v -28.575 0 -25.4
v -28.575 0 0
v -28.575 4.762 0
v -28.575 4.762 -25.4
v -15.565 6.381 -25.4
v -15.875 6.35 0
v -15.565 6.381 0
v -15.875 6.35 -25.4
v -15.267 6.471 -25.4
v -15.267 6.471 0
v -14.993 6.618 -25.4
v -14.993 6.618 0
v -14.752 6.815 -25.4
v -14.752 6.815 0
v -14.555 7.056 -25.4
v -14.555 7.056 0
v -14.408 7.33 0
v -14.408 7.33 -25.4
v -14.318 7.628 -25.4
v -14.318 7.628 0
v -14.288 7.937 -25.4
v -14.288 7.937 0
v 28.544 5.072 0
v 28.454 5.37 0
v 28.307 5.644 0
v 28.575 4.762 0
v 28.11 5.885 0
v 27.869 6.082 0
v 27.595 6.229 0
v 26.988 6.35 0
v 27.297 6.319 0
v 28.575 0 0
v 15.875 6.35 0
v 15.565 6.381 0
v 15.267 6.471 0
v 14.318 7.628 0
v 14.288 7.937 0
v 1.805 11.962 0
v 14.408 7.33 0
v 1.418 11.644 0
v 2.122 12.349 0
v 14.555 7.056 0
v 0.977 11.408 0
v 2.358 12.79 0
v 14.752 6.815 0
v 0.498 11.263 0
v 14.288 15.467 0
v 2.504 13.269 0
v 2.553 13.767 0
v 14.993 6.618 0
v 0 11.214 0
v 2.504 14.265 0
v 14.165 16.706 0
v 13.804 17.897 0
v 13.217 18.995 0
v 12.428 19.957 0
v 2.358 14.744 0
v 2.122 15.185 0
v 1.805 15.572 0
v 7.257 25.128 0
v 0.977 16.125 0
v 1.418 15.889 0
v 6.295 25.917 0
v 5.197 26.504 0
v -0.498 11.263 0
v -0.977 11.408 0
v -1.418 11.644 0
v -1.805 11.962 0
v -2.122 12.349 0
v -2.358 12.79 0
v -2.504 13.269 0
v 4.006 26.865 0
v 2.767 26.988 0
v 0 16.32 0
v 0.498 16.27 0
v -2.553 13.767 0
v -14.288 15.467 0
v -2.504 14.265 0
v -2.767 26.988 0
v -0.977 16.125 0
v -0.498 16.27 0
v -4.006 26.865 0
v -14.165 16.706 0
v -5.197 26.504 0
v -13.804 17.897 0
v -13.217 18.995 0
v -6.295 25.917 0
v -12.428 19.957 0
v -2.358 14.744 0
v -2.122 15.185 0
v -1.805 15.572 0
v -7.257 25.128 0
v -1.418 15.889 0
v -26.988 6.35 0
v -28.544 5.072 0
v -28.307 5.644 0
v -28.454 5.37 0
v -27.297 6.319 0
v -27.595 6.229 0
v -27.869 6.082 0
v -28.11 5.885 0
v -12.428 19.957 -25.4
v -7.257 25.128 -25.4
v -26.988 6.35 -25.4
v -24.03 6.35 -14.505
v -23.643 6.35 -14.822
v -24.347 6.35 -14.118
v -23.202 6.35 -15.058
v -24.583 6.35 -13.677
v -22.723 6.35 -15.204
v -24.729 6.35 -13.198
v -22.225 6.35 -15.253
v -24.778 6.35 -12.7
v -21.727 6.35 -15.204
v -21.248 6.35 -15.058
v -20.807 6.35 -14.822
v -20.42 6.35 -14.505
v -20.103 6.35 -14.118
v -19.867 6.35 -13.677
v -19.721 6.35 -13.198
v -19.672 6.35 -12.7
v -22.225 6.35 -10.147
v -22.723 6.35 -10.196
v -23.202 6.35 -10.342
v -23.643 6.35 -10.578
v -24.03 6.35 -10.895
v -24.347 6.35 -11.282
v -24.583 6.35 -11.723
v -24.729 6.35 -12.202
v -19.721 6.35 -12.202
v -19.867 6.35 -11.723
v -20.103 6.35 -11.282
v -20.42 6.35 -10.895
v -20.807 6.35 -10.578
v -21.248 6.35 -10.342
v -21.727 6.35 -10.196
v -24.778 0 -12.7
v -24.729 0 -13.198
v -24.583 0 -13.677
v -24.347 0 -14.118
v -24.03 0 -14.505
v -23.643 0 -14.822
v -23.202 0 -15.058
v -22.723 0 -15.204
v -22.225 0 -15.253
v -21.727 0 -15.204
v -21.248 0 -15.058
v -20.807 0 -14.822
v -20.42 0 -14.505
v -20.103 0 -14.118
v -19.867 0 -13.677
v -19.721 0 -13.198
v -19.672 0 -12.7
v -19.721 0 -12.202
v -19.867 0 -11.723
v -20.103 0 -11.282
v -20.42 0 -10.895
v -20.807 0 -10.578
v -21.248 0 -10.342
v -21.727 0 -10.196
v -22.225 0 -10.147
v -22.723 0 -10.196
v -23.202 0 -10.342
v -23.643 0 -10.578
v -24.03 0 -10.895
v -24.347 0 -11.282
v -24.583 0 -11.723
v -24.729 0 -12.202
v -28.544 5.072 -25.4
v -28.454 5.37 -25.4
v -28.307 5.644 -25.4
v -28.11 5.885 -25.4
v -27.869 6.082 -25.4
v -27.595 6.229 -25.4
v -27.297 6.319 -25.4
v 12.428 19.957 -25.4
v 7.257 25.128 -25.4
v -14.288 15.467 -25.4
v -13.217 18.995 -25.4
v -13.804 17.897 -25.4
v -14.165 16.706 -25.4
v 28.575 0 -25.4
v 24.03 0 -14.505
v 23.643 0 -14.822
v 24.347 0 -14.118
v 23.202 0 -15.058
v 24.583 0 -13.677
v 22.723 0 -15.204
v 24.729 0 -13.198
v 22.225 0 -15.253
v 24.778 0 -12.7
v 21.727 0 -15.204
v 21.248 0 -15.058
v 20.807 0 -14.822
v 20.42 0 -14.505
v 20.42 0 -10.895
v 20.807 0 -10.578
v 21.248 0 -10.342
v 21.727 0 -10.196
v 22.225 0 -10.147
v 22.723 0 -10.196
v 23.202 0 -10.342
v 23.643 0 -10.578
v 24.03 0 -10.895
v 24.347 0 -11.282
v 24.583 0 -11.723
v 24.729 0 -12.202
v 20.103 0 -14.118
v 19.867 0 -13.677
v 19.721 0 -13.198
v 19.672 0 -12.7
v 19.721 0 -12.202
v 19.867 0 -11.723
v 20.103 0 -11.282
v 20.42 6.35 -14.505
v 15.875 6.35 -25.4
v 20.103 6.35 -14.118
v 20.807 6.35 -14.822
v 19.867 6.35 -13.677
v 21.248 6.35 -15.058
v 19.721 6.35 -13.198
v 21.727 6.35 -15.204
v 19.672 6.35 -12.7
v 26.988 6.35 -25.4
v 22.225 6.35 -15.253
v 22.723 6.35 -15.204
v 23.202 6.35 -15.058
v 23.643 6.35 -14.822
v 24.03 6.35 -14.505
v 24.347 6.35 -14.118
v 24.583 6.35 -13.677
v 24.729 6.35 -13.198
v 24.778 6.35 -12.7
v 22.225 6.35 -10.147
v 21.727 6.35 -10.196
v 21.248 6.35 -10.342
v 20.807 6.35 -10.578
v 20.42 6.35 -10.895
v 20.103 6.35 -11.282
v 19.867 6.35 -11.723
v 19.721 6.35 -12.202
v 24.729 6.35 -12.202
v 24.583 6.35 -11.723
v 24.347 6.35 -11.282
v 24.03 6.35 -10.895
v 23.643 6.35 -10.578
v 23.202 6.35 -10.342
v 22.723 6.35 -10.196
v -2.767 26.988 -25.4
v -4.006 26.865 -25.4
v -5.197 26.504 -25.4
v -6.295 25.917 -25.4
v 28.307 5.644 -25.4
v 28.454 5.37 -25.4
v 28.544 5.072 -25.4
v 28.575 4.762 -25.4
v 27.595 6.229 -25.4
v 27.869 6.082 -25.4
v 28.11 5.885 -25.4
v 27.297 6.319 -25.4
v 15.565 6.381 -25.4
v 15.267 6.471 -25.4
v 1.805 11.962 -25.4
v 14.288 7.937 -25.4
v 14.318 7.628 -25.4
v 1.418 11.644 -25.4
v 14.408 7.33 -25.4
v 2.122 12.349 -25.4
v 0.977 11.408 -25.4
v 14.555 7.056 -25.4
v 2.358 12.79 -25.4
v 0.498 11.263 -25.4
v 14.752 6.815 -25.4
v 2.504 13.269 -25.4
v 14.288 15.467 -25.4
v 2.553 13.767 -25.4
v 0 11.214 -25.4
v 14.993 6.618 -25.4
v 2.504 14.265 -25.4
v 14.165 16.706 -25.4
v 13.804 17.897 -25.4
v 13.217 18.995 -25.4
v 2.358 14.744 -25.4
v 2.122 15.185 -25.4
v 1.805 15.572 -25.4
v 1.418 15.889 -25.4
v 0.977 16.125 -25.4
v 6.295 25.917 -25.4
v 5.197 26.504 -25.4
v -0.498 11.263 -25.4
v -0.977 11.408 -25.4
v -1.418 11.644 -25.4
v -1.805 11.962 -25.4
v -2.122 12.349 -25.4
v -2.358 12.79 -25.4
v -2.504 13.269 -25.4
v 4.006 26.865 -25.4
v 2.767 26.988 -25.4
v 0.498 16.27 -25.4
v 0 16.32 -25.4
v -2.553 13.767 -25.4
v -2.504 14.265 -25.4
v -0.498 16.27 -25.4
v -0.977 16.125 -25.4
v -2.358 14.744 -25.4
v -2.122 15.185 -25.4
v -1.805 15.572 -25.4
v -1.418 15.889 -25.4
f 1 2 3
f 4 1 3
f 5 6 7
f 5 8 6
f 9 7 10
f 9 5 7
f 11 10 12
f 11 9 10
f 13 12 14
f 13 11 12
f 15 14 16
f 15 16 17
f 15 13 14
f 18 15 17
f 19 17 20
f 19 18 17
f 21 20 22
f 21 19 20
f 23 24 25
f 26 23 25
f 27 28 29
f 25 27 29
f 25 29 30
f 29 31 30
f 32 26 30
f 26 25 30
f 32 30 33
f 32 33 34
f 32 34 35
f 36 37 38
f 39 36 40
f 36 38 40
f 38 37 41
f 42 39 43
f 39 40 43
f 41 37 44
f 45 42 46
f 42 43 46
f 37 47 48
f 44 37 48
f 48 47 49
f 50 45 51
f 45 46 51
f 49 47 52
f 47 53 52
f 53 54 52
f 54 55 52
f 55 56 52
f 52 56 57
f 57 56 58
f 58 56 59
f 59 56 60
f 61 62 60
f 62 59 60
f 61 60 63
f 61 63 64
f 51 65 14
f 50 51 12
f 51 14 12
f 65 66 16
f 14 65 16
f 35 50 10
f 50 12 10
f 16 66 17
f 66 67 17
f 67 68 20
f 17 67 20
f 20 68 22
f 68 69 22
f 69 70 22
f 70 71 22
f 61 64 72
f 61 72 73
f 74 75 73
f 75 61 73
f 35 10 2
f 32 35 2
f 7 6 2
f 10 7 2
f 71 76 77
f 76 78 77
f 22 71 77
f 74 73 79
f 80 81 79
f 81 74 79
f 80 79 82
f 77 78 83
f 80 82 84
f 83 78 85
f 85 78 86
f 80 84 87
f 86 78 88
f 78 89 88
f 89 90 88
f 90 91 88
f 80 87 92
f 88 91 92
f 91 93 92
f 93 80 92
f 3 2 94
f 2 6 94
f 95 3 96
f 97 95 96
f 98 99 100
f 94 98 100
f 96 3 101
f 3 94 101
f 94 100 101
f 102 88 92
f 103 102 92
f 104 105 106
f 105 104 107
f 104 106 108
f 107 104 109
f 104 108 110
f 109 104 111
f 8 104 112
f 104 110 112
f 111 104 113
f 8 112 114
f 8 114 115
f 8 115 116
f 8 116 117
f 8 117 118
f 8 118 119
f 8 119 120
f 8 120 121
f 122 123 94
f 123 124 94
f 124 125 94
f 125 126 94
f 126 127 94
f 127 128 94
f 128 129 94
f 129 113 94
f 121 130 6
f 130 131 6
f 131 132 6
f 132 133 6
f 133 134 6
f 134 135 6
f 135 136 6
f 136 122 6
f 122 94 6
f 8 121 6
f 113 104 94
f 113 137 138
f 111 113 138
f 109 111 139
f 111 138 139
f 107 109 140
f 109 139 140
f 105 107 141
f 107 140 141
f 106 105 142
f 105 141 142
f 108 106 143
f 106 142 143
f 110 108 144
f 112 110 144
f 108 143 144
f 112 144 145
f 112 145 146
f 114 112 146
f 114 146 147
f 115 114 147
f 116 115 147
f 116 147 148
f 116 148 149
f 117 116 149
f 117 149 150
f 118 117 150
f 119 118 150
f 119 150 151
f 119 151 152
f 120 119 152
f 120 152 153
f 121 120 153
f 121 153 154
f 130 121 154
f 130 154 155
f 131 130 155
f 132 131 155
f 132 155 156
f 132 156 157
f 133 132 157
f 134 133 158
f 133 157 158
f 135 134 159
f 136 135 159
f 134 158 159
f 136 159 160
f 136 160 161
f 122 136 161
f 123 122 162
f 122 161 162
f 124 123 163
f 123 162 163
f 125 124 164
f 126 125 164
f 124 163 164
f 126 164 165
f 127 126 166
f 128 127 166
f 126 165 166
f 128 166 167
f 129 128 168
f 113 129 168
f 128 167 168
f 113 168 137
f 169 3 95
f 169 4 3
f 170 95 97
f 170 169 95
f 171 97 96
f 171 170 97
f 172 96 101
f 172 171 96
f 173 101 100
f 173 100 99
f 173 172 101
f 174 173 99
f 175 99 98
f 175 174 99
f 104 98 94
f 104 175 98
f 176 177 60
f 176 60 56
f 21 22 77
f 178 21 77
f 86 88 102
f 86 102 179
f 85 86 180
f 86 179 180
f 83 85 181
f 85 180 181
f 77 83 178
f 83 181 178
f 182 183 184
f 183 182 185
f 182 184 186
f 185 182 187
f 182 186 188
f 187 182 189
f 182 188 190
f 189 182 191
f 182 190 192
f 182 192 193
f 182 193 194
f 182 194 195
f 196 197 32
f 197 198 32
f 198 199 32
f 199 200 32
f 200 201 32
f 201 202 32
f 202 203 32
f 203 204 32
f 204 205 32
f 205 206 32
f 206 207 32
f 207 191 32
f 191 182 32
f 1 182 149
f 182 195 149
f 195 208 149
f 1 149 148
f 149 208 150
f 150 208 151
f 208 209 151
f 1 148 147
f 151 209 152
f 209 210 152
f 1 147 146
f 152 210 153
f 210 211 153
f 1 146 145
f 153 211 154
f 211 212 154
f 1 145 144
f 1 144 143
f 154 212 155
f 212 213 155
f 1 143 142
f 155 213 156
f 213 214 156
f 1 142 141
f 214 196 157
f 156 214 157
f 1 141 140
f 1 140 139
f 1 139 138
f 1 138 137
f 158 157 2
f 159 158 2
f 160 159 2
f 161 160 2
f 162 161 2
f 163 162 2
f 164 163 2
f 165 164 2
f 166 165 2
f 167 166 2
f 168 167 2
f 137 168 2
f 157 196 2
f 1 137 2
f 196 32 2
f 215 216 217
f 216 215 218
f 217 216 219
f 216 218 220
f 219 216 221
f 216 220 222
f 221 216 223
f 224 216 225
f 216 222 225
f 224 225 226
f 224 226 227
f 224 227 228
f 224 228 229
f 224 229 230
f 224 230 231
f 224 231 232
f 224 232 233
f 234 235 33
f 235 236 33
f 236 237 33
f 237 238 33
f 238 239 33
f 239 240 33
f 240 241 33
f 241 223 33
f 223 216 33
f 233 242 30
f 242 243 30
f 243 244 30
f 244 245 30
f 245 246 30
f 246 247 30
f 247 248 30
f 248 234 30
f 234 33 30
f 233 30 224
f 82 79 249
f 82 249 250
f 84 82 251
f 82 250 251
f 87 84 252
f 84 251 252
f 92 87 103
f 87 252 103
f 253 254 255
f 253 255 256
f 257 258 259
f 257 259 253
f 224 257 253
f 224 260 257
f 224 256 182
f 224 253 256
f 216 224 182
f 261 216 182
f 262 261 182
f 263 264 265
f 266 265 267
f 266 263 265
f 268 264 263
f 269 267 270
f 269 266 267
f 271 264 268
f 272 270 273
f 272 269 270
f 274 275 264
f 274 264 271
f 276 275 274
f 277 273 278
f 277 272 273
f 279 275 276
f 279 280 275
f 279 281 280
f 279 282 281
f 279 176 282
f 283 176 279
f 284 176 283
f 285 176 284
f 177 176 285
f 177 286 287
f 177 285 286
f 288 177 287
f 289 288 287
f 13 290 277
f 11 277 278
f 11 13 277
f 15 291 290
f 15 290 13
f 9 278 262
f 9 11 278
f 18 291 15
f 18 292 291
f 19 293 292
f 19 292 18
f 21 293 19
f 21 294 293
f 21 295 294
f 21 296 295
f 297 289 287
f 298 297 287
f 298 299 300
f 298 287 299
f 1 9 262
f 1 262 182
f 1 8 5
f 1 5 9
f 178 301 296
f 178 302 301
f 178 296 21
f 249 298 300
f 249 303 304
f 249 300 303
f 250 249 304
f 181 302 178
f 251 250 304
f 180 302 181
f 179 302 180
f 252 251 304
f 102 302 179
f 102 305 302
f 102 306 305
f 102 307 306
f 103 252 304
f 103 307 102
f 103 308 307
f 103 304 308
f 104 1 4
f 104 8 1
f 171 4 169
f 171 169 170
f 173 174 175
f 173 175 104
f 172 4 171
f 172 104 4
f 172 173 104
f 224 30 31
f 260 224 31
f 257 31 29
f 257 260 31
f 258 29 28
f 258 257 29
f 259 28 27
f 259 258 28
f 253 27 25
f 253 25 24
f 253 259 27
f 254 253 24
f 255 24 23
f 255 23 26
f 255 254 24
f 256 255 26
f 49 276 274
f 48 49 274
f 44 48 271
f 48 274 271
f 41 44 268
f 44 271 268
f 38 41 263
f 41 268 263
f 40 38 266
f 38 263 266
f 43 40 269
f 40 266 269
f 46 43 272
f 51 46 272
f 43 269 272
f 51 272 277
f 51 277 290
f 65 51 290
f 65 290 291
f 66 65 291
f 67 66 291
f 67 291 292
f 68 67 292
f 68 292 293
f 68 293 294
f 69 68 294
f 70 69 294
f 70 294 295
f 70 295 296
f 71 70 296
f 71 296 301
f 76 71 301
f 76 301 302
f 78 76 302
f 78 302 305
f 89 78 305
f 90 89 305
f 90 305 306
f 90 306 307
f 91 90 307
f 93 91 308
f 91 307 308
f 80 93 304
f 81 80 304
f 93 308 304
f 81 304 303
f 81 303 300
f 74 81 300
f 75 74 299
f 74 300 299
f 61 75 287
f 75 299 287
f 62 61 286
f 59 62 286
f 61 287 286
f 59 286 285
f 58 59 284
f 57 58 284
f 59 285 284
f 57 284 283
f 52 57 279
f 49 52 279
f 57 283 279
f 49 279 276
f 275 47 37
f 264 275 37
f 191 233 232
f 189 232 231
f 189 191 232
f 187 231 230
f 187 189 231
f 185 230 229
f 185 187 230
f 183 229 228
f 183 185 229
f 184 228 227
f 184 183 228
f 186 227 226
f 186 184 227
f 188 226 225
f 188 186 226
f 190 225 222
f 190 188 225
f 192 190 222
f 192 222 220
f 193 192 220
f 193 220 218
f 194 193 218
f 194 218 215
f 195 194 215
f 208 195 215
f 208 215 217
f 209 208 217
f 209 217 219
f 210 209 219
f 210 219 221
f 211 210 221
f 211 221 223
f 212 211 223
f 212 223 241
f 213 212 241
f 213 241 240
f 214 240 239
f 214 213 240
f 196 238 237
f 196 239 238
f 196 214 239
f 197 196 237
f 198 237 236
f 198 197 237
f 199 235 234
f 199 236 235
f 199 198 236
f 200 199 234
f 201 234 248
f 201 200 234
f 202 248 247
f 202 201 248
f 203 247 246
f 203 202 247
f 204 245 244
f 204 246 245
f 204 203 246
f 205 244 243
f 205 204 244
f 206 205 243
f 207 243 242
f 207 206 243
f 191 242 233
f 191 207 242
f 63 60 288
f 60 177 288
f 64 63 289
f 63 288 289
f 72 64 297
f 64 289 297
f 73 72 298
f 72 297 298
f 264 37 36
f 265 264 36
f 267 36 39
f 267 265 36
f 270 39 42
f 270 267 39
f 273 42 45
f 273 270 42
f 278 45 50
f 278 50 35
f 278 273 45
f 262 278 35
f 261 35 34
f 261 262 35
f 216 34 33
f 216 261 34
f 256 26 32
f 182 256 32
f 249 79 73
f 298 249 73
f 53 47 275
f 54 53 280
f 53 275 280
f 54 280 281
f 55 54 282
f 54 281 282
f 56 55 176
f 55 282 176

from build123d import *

# Parameters (mm, degrees)
BOSS_EXTRUDE1_DEPTH = 25.4
FILLET1_R           = 1.5875
FILLET3_R           = 6.35
SKETCH2_R           = 2.5527
CUT_EXTRUDE1_DEPTH  = 47.797604439
SKETCH4_R           = 2.5527
CUT_EXTRUDE2_DEPTH  = 47.797604439


with BuildPart() as part:
    # Sketch1 → Boss-Extrude1 (new body)
    with BuildSketch(Plane.XY):
        Polygon((-5.3975, 26.9875), (5.3975, 26.9875), (14.2875, 18.0975), (14.2875, 6.35), (28.575, 6.35), (28.575, 0), (-28.575, 0), (-28.575, 6.35), (-14.2875, 6.35), (-14.2875, 18.0975), align=None)
    extrude(amount=-BOSS_EXTRUDE1_DEPTH)

    # Fillet1
    fillet1_edges = [part.edges().sort_by_distance(p)[0] for p in [
        (14.2875, 6.35, -12.7),
        (28.575, 6.35, -12.7),
        (-28.575, 6.35, -12.7),
        (-14.2875, 6.35, -12.7),
    ]]
    fillet(fillet1_edges, radius=FILLET1_R)

    # Fillet3
    fillet3_edges = [part.edges().sort_by_distance(p)[0] for p in [
        (-5.3975, 26.9875, -12.7),
        (5.3975, 26.9875, -12.7),
        (14.2875, 18.0975, -12.7),
        (-14.2875, 18.0975, -12.7),
    ]]
    fillet(fillet3_edges, radius=FILLET3_R)

    # Sketch2 → Cut-Extrude1 (cut, through all)
    with BuildSketch(Plane.XZ):
        with Locations(Location((-22.225, -12.7, 0), (0, 0, 180))):
            Circle(SKETCH2_R)
    cut_extrude1 = extrude(amount=-CUT_EXTRUDE1_DEPTH, mode=Mode.SUBTRACT)

    # Mirror1: Cut-Extrude1 across plane
    add(cut_extrude1.mirror(Plane(origin=(0, 0, 0), x_dir=(0, 0, 1), z_dir=(1, 0, 0))), mode=Mode.SUBTRACT)

    # Sketch4 → Cut-Extrude2 (cut, through all)
    with BuildSketch(Plane(origin=(0, 0, -25.4), x_dir=(-1, 0, 0), z_dir=(0, 0, -1))):
        with Locations(Location((0, 13.7668, 0), (0, 0, 180))):
            Circle(SKETCH4_R)
    extrude(amount=-CUT_EXTRUDE2_DEPTH, mode=Mode.SUBTRACT)


solid = part.part
